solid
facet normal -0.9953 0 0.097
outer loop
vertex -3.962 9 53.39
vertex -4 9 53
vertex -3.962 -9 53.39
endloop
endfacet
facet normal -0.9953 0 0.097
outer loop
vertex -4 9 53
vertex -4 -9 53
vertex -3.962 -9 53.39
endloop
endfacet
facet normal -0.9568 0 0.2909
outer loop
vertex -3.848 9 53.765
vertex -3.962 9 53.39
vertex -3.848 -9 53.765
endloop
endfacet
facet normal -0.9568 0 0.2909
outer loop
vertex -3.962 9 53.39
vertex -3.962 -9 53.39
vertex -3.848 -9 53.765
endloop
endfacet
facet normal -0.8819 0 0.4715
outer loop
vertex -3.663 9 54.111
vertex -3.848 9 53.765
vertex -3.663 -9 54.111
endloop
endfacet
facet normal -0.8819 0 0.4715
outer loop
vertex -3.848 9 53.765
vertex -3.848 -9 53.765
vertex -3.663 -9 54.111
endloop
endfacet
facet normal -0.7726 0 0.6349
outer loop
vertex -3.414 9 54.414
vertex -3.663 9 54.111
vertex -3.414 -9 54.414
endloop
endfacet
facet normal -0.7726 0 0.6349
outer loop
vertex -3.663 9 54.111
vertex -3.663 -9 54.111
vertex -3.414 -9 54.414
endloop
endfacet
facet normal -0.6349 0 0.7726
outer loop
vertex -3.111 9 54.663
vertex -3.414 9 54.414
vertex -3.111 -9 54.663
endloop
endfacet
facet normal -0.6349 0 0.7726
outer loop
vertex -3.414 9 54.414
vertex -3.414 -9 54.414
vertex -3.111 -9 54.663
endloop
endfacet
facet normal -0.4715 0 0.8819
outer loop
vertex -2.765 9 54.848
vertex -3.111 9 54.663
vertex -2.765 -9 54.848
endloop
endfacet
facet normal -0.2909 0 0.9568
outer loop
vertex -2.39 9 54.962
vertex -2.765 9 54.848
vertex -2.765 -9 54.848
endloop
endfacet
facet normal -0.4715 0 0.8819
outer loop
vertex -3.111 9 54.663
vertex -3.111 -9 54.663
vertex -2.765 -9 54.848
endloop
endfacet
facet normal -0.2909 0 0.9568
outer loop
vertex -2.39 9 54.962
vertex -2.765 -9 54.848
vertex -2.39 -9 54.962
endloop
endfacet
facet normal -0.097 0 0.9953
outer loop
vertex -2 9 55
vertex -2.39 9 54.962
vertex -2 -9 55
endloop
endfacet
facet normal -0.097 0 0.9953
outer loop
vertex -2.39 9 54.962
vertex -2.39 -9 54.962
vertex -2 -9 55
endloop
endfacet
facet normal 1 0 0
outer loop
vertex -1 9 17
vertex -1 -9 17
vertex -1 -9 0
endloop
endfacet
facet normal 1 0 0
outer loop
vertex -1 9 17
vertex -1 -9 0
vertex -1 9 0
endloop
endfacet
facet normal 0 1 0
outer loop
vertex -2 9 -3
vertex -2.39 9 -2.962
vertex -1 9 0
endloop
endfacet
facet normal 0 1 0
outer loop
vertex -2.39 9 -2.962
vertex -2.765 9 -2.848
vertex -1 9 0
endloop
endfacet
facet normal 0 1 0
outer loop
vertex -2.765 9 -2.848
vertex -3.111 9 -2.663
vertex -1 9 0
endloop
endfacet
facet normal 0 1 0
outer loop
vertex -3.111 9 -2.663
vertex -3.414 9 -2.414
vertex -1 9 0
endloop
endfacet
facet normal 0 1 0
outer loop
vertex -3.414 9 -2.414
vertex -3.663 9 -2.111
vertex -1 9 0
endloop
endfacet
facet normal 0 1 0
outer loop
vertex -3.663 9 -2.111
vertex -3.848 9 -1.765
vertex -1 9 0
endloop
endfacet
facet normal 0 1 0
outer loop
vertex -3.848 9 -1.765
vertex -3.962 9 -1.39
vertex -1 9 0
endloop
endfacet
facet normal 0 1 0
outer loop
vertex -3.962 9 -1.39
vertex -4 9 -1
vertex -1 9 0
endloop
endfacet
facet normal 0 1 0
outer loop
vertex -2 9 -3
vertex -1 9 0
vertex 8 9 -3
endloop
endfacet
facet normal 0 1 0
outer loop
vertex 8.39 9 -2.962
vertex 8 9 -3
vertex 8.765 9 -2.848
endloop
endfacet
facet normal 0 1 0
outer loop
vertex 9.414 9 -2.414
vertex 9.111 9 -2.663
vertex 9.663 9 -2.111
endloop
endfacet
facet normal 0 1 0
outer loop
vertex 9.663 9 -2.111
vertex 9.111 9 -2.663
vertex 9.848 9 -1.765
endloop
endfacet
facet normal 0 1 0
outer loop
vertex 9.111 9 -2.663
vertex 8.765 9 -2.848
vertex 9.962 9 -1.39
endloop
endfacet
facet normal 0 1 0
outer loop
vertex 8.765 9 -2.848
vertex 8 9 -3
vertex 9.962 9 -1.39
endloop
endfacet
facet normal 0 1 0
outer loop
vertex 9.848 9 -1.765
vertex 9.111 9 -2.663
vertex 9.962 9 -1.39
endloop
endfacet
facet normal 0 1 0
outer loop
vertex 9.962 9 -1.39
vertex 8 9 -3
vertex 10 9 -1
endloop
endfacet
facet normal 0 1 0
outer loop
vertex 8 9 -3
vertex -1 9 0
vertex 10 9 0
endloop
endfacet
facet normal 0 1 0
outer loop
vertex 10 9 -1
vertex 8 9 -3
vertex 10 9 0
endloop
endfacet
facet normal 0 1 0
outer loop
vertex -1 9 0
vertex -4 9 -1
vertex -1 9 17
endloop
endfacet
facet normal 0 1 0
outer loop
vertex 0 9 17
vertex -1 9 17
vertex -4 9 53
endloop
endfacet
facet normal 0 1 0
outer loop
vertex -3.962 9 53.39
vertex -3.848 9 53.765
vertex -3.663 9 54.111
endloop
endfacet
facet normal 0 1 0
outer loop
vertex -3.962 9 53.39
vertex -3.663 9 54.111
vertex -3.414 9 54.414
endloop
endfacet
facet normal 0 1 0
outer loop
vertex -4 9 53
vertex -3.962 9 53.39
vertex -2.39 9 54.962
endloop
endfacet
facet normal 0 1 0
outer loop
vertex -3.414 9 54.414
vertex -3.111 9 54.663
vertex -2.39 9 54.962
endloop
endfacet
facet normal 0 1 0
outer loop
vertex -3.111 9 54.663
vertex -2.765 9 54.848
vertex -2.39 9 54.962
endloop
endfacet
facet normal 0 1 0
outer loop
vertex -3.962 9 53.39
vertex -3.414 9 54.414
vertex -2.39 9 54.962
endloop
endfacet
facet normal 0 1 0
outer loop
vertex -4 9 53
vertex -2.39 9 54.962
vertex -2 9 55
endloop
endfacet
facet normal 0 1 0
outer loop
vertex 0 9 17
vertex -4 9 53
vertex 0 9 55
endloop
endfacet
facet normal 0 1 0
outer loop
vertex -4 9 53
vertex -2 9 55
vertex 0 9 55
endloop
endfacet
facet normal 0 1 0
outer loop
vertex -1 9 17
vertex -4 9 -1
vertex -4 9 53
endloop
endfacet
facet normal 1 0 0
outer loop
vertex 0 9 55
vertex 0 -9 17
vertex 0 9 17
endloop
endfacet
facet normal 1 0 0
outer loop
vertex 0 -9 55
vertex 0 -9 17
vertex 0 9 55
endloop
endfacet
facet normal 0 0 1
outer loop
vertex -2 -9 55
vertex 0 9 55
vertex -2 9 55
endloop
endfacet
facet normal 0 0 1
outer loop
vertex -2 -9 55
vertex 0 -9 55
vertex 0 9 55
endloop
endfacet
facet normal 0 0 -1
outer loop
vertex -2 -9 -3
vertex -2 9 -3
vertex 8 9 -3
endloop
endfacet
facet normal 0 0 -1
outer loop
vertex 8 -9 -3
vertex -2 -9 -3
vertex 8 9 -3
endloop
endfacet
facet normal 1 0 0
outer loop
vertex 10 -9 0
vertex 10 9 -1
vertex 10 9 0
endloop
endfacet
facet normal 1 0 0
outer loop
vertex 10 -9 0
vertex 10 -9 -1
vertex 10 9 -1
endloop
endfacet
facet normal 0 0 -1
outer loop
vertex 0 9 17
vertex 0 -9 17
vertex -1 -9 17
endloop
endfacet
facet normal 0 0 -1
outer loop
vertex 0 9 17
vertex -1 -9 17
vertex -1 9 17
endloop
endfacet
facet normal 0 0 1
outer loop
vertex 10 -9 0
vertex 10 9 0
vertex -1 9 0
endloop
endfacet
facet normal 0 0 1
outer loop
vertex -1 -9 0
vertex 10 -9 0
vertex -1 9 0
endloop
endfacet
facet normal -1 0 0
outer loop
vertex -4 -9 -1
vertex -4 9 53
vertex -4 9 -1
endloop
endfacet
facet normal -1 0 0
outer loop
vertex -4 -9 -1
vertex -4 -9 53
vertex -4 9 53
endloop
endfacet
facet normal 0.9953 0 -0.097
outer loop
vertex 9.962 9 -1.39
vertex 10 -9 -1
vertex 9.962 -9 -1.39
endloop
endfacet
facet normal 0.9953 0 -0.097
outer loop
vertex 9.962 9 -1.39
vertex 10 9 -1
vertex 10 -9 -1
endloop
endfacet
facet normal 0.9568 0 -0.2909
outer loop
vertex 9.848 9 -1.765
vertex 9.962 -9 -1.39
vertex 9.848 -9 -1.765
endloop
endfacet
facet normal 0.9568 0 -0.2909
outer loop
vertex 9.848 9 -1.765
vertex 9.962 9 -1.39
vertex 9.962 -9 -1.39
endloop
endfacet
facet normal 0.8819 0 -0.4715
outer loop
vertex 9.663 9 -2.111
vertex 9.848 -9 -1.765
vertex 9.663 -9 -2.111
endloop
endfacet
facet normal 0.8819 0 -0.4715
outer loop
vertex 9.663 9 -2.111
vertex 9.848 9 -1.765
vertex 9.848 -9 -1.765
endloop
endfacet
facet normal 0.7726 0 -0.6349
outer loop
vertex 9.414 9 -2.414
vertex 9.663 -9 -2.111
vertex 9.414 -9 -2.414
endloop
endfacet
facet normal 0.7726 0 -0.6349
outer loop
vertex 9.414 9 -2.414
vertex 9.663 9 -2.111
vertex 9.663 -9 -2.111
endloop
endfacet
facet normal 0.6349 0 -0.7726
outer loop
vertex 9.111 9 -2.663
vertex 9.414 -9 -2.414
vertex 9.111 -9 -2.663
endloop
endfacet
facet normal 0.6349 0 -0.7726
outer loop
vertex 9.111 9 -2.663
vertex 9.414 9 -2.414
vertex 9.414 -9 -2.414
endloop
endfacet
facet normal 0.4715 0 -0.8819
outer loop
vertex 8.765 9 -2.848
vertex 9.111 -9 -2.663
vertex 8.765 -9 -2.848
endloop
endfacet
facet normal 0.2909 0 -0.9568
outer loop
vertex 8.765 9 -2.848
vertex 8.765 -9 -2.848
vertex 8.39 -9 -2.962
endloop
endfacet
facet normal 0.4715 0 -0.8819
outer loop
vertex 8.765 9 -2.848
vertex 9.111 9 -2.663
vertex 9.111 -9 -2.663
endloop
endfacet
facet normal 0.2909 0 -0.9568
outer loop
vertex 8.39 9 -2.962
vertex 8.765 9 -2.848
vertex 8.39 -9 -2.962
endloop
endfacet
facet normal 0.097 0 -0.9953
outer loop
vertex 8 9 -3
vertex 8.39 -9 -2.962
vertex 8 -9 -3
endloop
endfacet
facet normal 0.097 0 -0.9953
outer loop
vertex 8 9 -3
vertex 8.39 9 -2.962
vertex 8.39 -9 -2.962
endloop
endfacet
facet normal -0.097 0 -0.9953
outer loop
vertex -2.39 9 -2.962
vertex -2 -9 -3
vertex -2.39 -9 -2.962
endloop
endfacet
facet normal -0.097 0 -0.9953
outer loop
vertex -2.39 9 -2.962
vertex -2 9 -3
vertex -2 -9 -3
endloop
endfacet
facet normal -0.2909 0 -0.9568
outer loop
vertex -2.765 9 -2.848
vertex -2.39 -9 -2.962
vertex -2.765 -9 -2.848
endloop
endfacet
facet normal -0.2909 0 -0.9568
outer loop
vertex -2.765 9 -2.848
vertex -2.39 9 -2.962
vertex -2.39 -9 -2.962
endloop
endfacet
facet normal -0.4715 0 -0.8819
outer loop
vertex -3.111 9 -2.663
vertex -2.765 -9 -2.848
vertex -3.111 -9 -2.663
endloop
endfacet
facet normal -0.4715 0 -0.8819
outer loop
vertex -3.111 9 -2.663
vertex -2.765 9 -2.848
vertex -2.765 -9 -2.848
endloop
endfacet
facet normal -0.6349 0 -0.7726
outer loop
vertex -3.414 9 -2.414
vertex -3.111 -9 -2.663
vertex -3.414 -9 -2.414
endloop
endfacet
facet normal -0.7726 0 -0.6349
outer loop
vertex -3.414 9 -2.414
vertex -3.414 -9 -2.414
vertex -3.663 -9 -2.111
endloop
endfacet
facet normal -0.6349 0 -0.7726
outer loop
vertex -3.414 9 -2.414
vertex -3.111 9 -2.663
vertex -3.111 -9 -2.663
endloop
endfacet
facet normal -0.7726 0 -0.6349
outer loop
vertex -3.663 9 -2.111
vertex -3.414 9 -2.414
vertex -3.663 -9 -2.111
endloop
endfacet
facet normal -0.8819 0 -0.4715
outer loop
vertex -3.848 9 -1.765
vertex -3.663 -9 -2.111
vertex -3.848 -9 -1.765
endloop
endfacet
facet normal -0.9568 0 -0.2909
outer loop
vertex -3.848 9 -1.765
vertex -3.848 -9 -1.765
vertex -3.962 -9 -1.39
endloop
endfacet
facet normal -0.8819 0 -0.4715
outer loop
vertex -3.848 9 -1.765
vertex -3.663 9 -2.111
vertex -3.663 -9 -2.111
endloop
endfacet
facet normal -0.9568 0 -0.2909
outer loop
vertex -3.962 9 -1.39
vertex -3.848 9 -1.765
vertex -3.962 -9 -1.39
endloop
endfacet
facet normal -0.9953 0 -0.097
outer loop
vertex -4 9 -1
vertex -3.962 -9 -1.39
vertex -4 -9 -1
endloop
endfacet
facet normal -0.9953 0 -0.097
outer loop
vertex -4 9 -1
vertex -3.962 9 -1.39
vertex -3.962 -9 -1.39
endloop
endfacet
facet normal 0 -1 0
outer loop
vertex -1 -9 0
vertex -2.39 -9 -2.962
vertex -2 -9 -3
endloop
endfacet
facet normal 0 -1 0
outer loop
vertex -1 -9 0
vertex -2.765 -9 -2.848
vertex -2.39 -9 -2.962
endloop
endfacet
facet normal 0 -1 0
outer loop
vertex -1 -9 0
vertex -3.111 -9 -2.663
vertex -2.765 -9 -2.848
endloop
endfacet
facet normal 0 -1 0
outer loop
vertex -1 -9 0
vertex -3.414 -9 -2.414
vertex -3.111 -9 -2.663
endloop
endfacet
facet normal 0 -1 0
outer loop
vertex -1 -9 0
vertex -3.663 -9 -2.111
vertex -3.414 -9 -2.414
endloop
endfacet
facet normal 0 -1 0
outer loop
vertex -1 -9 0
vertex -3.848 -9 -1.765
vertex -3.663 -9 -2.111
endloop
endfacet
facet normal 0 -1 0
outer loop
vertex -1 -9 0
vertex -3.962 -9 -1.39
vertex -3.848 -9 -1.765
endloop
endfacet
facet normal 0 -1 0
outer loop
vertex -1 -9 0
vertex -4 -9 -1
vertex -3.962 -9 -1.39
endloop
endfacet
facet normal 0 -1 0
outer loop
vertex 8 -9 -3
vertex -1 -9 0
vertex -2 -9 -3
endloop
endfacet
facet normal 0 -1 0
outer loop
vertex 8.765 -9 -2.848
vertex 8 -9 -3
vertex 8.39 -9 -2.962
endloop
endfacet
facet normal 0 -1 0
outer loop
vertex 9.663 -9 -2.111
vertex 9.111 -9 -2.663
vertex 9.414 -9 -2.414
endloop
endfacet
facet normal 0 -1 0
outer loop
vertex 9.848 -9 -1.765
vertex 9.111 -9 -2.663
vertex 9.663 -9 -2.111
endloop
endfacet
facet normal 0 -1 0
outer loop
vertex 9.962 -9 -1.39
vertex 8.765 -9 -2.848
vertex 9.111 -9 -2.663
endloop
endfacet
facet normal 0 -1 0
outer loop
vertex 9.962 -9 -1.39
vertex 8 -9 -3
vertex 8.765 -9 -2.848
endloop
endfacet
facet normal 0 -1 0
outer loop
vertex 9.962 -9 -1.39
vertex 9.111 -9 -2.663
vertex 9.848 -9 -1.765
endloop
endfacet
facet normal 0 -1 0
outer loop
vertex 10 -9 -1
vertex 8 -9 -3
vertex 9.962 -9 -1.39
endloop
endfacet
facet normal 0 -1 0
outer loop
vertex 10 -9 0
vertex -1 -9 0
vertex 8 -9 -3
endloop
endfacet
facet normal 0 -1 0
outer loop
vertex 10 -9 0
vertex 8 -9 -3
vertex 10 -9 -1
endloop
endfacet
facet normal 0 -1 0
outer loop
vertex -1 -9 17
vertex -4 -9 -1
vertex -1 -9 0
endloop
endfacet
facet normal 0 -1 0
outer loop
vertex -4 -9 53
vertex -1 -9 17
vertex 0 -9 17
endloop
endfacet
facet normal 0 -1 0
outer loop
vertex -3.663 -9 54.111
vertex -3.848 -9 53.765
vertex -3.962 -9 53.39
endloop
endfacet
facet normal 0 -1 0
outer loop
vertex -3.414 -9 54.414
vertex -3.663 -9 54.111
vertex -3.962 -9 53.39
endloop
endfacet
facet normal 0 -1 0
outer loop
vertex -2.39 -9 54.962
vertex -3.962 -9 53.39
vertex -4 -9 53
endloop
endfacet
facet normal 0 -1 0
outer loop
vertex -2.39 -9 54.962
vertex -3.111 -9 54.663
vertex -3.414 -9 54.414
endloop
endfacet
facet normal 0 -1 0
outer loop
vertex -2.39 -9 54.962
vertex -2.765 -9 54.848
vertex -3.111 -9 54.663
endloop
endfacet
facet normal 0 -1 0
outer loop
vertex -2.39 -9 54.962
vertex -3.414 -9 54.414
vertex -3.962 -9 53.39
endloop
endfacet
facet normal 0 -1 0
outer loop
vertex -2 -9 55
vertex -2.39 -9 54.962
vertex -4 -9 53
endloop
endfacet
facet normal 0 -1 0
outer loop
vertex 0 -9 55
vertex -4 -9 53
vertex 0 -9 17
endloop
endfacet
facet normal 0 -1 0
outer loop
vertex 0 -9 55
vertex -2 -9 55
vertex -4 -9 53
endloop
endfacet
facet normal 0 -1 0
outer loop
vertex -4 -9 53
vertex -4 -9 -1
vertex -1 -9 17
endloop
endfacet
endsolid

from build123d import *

# Parameters (mm, degrees)
F1_DEPTH = 9
F2_R     = 2
F3_W     = 18
F3_H     = 17
F4_DEPTH = 1


with BuildPart() as f1:
    # F0 (on Front) → F1 (new body, symmetric)
    with BuildSketch(Plane.XZ):
        Polygon((10, 0), (0, 0), (0, 55), (-4, 55), (-4, -3), (10, -3), align=None)
    extrude(amount=F1_DEPTH, both=True)

    # F2
    f2_edges = [f1.edges().sort_by_distance(p)[0] for p in [
        (-4, 0, 55),
        (-4, 0, -3),
        (10, 0, -3),
    ]]
    fillet(f2_edges, radius=F2_R)

    # F3 (on face) → F4 (cut)
    with BuildSketch(Plane.YZ):
        with Locations((0, 8.5)):
            Rectangle(F3_W, F3_H)
    extrude(amount=-F4_DEPTH, mode=Mode.SUBTRACT)


solid = f1.part
